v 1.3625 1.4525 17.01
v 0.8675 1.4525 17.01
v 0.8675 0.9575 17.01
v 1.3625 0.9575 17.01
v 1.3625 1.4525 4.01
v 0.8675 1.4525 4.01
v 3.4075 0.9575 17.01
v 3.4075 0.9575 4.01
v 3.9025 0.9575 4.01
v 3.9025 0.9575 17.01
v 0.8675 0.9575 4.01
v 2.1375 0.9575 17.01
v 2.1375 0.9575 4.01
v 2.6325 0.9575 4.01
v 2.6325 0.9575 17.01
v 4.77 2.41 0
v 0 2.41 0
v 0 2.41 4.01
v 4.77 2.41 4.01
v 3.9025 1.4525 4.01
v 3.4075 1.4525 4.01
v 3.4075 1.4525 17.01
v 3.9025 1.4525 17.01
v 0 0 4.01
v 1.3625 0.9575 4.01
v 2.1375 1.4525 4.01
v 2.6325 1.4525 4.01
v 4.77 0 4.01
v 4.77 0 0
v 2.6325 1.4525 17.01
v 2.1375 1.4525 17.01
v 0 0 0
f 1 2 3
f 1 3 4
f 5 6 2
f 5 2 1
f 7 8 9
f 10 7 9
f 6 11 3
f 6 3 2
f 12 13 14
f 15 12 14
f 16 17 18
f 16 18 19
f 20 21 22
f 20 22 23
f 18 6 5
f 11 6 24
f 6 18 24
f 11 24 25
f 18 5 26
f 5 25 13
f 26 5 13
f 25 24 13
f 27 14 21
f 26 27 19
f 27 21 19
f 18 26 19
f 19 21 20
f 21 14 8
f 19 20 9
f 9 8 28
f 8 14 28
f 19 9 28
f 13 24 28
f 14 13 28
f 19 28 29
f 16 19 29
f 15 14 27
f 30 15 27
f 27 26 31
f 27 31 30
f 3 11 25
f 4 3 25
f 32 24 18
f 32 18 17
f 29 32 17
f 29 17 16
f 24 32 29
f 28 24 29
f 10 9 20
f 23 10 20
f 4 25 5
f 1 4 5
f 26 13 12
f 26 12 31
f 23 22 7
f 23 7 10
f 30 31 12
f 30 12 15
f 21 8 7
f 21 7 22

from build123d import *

# Parameters (mm, degrees)
SKETCH1_W           = 4.77
SKETCH1_H           = 4.01
BOSS_EXTRUDE1_DEPTH = 2.41
SKETCH3_W           = 0.495
SKETCH3_H           = 0.495
BOSS_EXTRUDE2_DEPTH = 13


with BuildPart() as part:
    # Sketch1 → Boss-Extrude1 (new body)
    with BuildSketch(Plane(origin=(0, 0, 0), x_dir=(1, 0, 0), z_dir=(0, 1, 0))):
        with Locations((2.385, -2.005)):
            Rectangle(SKETCH1_W, SKETCH1_H)
    extrude(amount=BOSS_EXTRUDE1_DEPTH)

    # Sketch3 → Boss-Extrude2 (add)
    with BuildSketch(Plane.XY.offset(4.01)):
        with Locations((3.655, 1.205)):
            Rectangle(SKETCH3_W, SKETCH3_H)
        with Locations((2.385, 1.205)):
            Rectangle(SKETCH3_W, SKETCH3_H)
        with Locations((1.115, 1.205)):
            Rectangle(SKETCH3_W, SKETCH3_H)
    extrude(amount=BOSS_EXTRUDE2_DEPTH)


solid = part.part
